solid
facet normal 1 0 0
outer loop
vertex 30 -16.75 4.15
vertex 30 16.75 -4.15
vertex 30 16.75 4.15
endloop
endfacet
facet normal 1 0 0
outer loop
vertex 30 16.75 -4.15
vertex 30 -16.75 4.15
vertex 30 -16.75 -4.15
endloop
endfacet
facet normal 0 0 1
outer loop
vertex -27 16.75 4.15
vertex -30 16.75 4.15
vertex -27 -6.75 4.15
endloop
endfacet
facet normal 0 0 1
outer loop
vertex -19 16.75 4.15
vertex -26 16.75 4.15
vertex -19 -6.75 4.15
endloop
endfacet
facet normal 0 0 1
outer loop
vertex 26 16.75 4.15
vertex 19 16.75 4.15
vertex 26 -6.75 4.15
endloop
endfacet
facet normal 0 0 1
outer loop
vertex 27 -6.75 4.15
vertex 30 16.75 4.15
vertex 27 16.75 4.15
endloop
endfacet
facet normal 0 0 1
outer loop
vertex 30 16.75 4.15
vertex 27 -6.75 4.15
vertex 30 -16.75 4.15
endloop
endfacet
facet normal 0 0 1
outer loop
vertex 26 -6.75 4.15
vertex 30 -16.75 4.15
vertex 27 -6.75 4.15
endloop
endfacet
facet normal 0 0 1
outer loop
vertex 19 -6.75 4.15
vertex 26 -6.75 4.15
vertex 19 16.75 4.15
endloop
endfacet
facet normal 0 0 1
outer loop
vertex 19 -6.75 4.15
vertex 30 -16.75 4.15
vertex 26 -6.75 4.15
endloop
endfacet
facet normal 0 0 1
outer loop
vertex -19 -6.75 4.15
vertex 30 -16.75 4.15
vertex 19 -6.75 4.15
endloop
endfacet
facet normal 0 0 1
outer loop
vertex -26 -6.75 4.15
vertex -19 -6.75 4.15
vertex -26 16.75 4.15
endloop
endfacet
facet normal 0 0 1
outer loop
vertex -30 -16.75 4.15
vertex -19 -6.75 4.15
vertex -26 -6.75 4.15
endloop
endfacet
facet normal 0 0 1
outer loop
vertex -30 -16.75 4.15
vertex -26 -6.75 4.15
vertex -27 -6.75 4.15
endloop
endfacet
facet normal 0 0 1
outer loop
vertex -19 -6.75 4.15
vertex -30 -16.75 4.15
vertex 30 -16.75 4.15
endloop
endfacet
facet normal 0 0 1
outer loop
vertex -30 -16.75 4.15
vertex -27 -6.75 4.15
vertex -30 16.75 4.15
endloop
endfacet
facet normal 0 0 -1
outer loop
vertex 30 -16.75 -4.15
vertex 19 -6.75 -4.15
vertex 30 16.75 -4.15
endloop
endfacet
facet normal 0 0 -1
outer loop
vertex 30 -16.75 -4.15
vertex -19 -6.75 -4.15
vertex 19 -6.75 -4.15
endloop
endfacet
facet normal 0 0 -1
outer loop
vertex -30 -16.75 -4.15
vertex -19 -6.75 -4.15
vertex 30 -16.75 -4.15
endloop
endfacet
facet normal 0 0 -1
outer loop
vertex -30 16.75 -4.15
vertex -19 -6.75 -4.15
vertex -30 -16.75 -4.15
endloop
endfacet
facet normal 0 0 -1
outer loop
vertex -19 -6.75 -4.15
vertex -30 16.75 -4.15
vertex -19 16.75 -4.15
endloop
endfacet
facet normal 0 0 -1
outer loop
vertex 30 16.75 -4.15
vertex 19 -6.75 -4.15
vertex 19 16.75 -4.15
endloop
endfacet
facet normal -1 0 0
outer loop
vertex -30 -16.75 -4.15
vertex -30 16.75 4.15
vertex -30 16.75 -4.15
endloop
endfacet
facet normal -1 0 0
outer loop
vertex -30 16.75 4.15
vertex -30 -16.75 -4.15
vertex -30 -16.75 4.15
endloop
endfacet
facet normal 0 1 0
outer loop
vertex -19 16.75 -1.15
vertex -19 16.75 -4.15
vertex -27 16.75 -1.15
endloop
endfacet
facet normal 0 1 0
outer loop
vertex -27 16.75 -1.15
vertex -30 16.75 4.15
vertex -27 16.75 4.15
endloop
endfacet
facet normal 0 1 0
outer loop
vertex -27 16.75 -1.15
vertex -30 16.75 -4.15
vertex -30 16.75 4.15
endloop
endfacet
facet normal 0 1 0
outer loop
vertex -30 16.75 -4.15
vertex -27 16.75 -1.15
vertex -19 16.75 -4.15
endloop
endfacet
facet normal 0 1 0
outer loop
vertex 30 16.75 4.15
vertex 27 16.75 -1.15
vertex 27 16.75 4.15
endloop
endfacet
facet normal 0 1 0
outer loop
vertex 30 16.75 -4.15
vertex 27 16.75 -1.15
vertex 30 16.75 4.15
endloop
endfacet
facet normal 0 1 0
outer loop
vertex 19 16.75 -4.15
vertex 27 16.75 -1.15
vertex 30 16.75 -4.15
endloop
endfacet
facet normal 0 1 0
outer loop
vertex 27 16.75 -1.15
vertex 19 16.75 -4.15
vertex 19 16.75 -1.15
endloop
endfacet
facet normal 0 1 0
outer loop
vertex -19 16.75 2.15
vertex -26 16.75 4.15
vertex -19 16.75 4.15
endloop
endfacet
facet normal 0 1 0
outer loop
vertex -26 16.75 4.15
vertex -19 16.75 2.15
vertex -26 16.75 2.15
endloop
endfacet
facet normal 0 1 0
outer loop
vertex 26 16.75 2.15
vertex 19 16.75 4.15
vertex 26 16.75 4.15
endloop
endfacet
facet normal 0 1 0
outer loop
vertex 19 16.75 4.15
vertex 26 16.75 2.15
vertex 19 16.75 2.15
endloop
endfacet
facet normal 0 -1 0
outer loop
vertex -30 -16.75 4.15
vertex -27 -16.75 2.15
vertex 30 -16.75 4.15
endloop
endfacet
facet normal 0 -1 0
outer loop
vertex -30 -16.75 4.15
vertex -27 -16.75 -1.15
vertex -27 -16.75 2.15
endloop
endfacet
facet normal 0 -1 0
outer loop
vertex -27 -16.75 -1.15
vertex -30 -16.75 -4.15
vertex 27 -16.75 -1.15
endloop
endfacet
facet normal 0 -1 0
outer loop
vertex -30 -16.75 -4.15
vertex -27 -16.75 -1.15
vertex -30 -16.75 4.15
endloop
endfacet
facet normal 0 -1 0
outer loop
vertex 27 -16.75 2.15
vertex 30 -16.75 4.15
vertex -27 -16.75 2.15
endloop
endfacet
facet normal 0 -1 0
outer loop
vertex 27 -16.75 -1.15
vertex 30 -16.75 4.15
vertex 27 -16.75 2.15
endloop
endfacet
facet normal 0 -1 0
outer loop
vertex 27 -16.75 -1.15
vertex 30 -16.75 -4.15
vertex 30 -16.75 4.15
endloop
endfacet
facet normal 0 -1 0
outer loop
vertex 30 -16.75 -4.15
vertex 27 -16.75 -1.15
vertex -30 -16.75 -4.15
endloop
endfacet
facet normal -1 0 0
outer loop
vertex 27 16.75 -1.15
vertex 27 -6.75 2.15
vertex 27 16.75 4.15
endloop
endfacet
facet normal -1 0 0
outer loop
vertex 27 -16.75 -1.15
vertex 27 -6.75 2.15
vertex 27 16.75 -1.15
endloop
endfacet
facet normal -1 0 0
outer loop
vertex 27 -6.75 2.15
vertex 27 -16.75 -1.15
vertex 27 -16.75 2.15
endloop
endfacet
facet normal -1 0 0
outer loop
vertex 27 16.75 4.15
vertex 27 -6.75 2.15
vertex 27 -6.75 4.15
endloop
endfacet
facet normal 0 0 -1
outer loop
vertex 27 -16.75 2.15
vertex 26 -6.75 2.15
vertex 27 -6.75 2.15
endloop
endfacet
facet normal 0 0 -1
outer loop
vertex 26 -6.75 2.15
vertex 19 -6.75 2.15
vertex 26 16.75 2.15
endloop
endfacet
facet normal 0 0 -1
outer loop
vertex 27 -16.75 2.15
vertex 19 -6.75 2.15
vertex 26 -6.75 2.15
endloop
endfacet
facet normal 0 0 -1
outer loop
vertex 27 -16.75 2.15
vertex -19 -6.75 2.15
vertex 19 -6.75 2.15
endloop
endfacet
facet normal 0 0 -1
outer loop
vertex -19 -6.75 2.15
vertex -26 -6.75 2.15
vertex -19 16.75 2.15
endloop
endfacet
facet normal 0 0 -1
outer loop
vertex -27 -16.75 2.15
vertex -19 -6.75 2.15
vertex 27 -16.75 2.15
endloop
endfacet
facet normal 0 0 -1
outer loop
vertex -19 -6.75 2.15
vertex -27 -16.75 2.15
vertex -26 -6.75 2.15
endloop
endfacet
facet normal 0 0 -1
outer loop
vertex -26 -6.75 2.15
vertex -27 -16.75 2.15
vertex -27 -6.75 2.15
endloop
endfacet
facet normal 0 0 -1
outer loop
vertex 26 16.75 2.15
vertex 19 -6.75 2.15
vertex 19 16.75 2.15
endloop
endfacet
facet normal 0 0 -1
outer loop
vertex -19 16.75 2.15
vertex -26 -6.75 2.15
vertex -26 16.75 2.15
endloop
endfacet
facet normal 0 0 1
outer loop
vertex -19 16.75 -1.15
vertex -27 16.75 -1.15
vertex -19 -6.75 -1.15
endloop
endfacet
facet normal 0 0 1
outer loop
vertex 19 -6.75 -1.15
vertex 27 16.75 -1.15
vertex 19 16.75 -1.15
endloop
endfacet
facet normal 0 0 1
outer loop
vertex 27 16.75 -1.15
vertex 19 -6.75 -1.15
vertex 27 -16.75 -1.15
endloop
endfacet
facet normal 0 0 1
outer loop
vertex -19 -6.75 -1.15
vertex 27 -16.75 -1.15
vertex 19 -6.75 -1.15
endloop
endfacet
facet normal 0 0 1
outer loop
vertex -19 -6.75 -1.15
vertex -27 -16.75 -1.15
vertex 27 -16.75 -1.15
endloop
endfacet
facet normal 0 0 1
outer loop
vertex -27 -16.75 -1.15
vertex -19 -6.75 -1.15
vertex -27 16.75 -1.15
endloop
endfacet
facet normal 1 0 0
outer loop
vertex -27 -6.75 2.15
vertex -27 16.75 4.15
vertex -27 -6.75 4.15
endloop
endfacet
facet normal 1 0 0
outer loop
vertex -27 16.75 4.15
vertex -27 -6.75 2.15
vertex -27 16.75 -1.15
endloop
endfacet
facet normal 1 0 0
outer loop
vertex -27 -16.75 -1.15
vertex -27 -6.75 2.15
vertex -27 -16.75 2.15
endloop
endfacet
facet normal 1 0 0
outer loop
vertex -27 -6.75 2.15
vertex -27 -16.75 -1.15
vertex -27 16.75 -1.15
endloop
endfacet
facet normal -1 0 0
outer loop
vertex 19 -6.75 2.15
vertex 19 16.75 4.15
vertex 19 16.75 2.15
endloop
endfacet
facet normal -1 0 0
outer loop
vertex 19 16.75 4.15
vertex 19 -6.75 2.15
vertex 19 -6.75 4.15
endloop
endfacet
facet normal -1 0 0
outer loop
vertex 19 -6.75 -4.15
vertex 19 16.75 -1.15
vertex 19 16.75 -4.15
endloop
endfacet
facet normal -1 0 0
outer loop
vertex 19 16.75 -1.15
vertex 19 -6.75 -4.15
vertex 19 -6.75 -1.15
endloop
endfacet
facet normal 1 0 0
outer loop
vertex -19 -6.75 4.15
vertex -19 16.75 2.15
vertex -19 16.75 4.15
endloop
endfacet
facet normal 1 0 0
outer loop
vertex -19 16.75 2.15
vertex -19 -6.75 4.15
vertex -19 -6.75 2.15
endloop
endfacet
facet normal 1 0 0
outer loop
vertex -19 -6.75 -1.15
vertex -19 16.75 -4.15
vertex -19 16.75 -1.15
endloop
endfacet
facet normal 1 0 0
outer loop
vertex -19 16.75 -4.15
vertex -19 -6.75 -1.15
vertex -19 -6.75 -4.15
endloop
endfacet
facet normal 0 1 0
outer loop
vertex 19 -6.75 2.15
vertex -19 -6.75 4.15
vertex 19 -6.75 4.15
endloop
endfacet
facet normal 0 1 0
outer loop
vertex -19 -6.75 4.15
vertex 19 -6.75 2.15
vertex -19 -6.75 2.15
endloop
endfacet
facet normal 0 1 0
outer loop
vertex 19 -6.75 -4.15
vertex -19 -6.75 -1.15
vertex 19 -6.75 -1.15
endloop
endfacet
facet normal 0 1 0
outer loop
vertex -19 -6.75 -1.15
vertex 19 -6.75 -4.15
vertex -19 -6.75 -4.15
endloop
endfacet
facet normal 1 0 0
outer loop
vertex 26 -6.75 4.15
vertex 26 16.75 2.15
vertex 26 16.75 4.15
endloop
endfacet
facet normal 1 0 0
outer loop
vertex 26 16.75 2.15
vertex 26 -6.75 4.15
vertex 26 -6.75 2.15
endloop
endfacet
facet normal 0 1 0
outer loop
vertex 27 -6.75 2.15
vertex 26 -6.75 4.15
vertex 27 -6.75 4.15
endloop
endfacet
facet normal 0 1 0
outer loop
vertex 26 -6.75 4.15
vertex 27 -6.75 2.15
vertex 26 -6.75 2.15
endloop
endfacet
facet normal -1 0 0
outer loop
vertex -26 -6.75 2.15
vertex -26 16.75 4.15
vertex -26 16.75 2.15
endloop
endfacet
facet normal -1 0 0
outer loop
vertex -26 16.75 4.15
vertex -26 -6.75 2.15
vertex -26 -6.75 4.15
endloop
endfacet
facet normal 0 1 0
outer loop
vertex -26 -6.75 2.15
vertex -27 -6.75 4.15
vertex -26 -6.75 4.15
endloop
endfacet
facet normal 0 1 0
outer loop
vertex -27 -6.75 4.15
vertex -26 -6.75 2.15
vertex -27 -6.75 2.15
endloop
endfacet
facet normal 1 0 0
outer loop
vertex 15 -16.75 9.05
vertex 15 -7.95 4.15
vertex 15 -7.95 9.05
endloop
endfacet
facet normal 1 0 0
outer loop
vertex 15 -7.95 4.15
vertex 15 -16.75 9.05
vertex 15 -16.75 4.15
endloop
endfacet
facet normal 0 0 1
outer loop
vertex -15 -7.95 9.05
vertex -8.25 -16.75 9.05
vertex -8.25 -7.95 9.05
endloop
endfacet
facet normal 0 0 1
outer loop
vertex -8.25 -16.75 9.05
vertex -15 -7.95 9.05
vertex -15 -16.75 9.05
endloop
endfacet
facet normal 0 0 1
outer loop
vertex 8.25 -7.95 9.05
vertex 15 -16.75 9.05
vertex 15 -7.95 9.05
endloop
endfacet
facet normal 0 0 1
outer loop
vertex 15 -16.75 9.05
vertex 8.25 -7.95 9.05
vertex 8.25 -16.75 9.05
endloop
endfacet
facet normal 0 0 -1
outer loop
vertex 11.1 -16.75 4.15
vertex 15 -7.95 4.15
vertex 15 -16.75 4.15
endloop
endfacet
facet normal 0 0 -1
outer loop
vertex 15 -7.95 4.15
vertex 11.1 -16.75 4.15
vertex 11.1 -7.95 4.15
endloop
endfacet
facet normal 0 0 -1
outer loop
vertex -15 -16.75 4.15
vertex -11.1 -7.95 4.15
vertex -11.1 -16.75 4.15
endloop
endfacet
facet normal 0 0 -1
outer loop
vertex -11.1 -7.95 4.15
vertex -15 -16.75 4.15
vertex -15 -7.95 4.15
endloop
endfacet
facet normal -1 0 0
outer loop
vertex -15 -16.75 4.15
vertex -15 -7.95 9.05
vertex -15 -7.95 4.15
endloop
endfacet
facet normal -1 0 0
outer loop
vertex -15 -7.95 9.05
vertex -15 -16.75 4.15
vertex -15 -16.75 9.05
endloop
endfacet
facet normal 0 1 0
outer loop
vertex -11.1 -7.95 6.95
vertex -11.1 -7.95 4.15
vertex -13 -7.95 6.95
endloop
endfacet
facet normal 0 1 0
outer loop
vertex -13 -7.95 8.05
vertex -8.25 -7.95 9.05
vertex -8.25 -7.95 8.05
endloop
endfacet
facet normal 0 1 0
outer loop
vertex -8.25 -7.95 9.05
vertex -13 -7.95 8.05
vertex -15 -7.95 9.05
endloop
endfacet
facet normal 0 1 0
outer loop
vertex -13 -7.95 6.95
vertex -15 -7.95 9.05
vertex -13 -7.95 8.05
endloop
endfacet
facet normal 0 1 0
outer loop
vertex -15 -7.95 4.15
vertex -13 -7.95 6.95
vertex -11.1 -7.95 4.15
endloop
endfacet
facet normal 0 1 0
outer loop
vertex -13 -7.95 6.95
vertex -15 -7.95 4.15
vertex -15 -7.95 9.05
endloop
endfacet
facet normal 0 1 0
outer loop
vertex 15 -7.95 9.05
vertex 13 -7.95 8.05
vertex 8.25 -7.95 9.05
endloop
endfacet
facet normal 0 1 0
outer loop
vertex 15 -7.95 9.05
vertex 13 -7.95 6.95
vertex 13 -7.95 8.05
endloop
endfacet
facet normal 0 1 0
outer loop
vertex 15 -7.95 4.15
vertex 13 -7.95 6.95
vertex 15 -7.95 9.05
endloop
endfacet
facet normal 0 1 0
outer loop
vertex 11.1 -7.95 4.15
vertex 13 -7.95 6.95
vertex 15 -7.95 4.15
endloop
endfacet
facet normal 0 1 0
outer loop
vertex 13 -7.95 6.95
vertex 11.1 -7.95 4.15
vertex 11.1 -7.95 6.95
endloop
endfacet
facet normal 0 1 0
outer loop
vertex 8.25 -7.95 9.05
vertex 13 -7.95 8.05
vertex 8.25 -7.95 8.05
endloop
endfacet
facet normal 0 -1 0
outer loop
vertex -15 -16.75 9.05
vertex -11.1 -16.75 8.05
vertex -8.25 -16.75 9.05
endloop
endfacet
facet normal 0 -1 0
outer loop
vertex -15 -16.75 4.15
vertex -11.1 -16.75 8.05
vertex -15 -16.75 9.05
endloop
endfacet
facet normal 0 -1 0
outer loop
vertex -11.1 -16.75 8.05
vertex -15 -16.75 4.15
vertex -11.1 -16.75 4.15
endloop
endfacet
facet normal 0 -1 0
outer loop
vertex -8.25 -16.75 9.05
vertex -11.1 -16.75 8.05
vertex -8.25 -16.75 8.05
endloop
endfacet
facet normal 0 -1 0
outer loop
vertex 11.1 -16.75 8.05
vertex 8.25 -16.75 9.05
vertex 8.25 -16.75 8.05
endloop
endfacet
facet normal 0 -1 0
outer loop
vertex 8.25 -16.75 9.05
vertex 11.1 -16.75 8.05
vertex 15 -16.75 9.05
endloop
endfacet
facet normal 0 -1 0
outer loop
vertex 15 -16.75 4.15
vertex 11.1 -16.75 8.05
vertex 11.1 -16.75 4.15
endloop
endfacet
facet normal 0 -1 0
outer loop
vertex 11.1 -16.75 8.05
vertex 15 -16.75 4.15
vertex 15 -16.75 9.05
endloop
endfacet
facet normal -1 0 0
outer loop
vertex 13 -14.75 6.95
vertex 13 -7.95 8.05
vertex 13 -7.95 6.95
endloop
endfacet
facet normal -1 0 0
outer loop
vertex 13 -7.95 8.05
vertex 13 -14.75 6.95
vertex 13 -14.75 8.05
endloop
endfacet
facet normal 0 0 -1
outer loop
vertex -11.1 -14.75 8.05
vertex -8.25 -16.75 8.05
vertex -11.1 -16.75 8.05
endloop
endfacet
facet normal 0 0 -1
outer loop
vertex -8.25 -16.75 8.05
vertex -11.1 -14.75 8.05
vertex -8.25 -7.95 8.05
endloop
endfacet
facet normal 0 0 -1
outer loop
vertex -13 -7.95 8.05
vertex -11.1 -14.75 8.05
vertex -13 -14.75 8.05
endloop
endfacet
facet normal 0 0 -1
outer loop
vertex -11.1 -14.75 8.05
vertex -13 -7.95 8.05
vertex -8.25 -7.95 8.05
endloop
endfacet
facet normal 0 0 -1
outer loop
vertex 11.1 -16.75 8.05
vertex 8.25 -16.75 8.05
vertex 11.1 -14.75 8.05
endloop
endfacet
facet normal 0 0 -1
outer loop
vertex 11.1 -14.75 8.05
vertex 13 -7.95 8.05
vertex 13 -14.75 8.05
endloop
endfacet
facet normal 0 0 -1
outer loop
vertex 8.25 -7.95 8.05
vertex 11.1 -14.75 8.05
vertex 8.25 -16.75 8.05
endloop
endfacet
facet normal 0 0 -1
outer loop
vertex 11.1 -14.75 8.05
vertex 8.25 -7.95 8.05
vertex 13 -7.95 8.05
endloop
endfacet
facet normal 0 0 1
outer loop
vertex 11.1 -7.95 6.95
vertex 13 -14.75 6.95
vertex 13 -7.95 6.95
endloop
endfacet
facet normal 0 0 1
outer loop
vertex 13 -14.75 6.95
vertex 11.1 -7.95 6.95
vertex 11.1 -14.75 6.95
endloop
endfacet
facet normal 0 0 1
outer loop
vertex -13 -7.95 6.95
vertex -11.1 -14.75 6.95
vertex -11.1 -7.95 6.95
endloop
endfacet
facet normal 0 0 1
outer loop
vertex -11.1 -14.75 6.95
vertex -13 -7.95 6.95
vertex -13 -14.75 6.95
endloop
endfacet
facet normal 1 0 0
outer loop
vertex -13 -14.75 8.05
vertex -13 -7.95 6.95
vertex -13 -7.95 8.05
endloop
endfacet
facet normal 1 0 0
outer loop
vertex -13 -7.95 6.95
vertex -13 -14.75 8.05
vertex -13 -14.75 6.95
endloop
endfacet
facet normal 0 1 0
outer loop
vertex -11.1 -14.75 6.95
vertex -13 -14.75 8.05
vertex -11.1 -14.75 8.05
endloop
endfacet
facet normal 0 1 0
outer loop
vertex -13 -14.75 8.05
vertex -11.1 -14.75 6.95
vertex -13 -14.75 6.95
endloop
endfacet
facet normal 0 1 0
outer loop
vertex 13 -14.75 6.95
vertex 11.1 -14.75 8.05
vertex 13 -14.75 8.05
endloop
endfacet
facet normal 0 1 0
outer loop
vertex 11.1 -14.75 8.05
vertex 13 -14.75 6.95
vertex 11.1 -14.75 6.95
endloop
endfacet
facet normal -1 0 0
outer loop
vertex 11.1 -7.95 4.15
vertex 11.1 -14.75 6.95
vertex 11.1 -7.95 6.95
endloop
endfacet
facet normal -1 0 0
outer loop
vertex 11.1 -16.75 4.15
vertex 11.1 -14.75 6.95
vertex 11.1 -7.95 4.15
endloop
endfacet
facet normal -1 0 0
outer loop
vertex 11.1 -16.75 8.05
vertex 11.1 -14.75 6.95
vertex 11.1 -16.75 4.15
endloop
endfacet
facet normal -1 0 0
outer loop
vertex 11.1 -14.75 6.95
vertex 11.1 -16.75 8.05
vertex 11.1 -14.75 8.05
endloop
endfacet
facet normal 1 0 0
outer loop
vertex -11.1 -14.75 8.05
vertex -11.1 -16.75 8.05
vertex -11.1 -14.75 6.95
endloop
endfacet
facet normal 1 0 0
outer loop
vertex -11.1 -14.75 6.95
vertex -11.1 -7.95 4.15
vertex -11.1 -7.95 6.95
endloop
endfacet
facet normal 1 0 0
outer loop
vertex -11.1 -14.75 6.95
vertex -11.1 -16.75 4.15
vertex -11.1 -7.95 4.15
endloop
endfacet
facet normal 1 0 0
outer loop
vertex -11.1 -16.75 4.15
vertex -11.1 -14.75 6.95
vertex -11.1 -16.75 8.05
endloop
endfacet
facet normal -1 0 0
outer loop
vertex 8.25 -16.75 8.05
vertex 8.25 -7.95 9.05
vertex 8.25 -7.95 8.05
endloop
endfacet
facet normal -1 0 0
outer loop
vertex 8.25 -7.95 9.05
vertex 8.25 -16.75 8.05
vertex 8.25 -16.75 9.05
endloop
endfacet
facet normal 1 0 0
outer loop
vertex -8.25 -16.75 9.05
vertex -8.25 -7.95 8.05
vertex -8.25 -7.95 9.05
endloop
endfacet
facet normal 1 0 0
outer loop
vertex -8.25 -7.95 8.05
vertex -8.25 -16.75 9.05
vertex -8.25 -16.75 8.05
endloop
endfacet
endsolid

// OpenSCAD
/*
    With this code you can make a camera holder for RPI camera from waveshare (http://www.waveshare.com/product/mini-pc/raspberry-pi/cameras/rpi-camera-b.htm) or for V2 RPI camera (https://www.raspberrypi.org/products/camera-module-v2/)
    
    The code was modified from Fernán Federici 2017 version.
    
    This is licensed under the Creative Commons - Attribution license (CC BY 4.0)
    Isaac Núñez 2020.
 
*/

///////////////////////
// Fluopi parameters

holder_x=54;//acrylic bed width to fit into holder
holder_z=3*1.1;//acrylic bed thickness to fit into holder, normally 3 mm acrylic. 1.1 correction factor applied to surpass acrylic manufacture variations.

////////////////////////
// Defined by the user

// Base holder parameters

sca_thick_up = 3; // holder scafold thickness
sca_thick_side = 3; // holder scafold thickness
sca_thick_down = 2; // holder scafold thickness
sca_deep = 10;  // holder scafold back deep, it have to be shorter than the distance to the screws in the camera PCB (14 mm aprox)
sca_arms_width = 11; // holder scafold arms width

sca_arms_space = 1;  // space attach relaxation


sca_trans = (sca_thick_up - sca_thick_down)/2; // translate the holder space to achieve the desired up and down thicknes

scafold_x = holder_x + 2*sca_thick_side;
scafold_y = 33.5; // depth
scafold_z = holder_z + sca_thick_up + sca_thick_down;


//camera holder parameters

side_thick = 2; //side support thickness
bottom_thick = 1; // bottom support thickness
back_thick = 2; // back support thickness

/////////////////////
//  Camera details:

////////////////////////////////
// Waveshare Chinesse camera //
///////////////////////////////
waveshare_cam_x=32.2 + 1; // 1mm of error
waveshare_cam_y=32.2; 
waveshare_cam_z=1.5*1.1;//thickness
WS_hold_x = 5.1 - 0.3;    // space between border and cable conector. 0.3 the security factor
WS_hold_y = 4.5 - 0.3;  // space between border and resistor. 0.3 the security factor

///////////////////
// RPI V2 camera //
///////////////////

RPIV2_cam_x = 25 + 1 ; // 1mm of error
RPIV2_cam_y = 24; 
RPIV2_cam_z = 1 + 0.1; // PCB thickness, 0.1 mm of error
RPIV2_connec_x = 22; // cable conector length
RPIV2_connec_z = 2.7+ 0.1; // cable conector thikness, 0.1 mm error

RPIV2_sensor_x = 16 + 0.5; // sensor base length (8.5 mm) or adaptor lenght + 0.5 mm error

V2_hold_x =(RPIV2_cam_x - RPIV2_sensor_x)/2 - 0.3;    // space between camera border and sensor base. 0.3 the security factor
V2_hold_y = 7 - 0.2;  // space between border and PCB first obstacle (sensor base or electronic componentes). 0.2 security value.


module cam_holder_base() {
    
    difference(){
    cube([scafold_x,scafold_y,scafold_z], center=true);
     translate([0,0,sca_trans])cube([holder_x,scafold_y*1.1,holder_z], center=true);
     translate([0,sca_deep/2,0])cube([scafold_x - 2*sca_arms_width,scafold_y - sca_deep,scafold_z], center=true);
     translate([holder_x/2-sca_arms_space/2,sca_deep/2,scafold_z/2])cube([sca_arms_space,scafold_y - sca_deep,scafold_z], center=true);
     translate([-holder_x/2+sca_arms_space/2,sca_deep/2,scafold_z/2])cube([sca_arms_space,scafold_y - sca_deep,scafold_z], center=true);
        
        }      
}

module camera_mount(camera){

    if(camera == "waveshare"){
            cam_x = waveshare_cam_x;
            cam_y = waveshare_cam_y;
            cam_z = waveshare_cam_z;
            hold_x = WS_hold_x;
            hold_y = WS_hold_y;
    
        support_z = cam_z+bottom_thick;
        support_y = hold_y + back_thick;
        translate([0,-scafold_y/2 + support_y/2,scafold_z/2+support_z/2])difference(){cube([cam_x+2*side_thick,support_y,support_z], center=true);
            translate([0,back_thick/2,-bottom_thick/2])cube([cam_x,hold_y,cam_z], center=true);
            translate([0,0,0])cube([cam_x - 2*hold_x,support_y,support_z], center=true);
    }
    }
    
    else if(camera == "RPIV2"){
            cam_x = RPIV2_cam_x;
            cam_y = RPIV2_cam_y;
            cam_z = RPIV2_cam_z;
            hold_x = V2_hold_x;
            hold_y = V2_hold_y;
            base_space = RPIV2_connec_x+0.2;
         
    support_z = cam_z+bottom_thick + RPIV2_connec_z;
    support_y = hold_y + back_thick;
    translate([0,-scafold_y/2 + support_y/2,scafold_z/2+support_z/2])difference(){cube([cam_x+2*side_thick,support_y,support_z], center=true);
        translate([0,back_thick/2,-bottom_thick/2 + RPIV2_connec_z/2])cube([cam_x,hold_y,cam_z], center=true); // camera PCB hole
        translate([0,0,-bottom_thick/2])cube([base_space,support_y,support_z-bottom_thick], center=true); // base hole
                translate([0,0,(support_z-bottom_thick)/2])cube([RPIV2_sensor_x,support_y,bottom_thick], center=true); // camera hole
    }
    }
    
}


cam_holder_base();

//uncomment the one you pretend to use

camera_mount("RPIV2");
//camera_mount("waveshare");
